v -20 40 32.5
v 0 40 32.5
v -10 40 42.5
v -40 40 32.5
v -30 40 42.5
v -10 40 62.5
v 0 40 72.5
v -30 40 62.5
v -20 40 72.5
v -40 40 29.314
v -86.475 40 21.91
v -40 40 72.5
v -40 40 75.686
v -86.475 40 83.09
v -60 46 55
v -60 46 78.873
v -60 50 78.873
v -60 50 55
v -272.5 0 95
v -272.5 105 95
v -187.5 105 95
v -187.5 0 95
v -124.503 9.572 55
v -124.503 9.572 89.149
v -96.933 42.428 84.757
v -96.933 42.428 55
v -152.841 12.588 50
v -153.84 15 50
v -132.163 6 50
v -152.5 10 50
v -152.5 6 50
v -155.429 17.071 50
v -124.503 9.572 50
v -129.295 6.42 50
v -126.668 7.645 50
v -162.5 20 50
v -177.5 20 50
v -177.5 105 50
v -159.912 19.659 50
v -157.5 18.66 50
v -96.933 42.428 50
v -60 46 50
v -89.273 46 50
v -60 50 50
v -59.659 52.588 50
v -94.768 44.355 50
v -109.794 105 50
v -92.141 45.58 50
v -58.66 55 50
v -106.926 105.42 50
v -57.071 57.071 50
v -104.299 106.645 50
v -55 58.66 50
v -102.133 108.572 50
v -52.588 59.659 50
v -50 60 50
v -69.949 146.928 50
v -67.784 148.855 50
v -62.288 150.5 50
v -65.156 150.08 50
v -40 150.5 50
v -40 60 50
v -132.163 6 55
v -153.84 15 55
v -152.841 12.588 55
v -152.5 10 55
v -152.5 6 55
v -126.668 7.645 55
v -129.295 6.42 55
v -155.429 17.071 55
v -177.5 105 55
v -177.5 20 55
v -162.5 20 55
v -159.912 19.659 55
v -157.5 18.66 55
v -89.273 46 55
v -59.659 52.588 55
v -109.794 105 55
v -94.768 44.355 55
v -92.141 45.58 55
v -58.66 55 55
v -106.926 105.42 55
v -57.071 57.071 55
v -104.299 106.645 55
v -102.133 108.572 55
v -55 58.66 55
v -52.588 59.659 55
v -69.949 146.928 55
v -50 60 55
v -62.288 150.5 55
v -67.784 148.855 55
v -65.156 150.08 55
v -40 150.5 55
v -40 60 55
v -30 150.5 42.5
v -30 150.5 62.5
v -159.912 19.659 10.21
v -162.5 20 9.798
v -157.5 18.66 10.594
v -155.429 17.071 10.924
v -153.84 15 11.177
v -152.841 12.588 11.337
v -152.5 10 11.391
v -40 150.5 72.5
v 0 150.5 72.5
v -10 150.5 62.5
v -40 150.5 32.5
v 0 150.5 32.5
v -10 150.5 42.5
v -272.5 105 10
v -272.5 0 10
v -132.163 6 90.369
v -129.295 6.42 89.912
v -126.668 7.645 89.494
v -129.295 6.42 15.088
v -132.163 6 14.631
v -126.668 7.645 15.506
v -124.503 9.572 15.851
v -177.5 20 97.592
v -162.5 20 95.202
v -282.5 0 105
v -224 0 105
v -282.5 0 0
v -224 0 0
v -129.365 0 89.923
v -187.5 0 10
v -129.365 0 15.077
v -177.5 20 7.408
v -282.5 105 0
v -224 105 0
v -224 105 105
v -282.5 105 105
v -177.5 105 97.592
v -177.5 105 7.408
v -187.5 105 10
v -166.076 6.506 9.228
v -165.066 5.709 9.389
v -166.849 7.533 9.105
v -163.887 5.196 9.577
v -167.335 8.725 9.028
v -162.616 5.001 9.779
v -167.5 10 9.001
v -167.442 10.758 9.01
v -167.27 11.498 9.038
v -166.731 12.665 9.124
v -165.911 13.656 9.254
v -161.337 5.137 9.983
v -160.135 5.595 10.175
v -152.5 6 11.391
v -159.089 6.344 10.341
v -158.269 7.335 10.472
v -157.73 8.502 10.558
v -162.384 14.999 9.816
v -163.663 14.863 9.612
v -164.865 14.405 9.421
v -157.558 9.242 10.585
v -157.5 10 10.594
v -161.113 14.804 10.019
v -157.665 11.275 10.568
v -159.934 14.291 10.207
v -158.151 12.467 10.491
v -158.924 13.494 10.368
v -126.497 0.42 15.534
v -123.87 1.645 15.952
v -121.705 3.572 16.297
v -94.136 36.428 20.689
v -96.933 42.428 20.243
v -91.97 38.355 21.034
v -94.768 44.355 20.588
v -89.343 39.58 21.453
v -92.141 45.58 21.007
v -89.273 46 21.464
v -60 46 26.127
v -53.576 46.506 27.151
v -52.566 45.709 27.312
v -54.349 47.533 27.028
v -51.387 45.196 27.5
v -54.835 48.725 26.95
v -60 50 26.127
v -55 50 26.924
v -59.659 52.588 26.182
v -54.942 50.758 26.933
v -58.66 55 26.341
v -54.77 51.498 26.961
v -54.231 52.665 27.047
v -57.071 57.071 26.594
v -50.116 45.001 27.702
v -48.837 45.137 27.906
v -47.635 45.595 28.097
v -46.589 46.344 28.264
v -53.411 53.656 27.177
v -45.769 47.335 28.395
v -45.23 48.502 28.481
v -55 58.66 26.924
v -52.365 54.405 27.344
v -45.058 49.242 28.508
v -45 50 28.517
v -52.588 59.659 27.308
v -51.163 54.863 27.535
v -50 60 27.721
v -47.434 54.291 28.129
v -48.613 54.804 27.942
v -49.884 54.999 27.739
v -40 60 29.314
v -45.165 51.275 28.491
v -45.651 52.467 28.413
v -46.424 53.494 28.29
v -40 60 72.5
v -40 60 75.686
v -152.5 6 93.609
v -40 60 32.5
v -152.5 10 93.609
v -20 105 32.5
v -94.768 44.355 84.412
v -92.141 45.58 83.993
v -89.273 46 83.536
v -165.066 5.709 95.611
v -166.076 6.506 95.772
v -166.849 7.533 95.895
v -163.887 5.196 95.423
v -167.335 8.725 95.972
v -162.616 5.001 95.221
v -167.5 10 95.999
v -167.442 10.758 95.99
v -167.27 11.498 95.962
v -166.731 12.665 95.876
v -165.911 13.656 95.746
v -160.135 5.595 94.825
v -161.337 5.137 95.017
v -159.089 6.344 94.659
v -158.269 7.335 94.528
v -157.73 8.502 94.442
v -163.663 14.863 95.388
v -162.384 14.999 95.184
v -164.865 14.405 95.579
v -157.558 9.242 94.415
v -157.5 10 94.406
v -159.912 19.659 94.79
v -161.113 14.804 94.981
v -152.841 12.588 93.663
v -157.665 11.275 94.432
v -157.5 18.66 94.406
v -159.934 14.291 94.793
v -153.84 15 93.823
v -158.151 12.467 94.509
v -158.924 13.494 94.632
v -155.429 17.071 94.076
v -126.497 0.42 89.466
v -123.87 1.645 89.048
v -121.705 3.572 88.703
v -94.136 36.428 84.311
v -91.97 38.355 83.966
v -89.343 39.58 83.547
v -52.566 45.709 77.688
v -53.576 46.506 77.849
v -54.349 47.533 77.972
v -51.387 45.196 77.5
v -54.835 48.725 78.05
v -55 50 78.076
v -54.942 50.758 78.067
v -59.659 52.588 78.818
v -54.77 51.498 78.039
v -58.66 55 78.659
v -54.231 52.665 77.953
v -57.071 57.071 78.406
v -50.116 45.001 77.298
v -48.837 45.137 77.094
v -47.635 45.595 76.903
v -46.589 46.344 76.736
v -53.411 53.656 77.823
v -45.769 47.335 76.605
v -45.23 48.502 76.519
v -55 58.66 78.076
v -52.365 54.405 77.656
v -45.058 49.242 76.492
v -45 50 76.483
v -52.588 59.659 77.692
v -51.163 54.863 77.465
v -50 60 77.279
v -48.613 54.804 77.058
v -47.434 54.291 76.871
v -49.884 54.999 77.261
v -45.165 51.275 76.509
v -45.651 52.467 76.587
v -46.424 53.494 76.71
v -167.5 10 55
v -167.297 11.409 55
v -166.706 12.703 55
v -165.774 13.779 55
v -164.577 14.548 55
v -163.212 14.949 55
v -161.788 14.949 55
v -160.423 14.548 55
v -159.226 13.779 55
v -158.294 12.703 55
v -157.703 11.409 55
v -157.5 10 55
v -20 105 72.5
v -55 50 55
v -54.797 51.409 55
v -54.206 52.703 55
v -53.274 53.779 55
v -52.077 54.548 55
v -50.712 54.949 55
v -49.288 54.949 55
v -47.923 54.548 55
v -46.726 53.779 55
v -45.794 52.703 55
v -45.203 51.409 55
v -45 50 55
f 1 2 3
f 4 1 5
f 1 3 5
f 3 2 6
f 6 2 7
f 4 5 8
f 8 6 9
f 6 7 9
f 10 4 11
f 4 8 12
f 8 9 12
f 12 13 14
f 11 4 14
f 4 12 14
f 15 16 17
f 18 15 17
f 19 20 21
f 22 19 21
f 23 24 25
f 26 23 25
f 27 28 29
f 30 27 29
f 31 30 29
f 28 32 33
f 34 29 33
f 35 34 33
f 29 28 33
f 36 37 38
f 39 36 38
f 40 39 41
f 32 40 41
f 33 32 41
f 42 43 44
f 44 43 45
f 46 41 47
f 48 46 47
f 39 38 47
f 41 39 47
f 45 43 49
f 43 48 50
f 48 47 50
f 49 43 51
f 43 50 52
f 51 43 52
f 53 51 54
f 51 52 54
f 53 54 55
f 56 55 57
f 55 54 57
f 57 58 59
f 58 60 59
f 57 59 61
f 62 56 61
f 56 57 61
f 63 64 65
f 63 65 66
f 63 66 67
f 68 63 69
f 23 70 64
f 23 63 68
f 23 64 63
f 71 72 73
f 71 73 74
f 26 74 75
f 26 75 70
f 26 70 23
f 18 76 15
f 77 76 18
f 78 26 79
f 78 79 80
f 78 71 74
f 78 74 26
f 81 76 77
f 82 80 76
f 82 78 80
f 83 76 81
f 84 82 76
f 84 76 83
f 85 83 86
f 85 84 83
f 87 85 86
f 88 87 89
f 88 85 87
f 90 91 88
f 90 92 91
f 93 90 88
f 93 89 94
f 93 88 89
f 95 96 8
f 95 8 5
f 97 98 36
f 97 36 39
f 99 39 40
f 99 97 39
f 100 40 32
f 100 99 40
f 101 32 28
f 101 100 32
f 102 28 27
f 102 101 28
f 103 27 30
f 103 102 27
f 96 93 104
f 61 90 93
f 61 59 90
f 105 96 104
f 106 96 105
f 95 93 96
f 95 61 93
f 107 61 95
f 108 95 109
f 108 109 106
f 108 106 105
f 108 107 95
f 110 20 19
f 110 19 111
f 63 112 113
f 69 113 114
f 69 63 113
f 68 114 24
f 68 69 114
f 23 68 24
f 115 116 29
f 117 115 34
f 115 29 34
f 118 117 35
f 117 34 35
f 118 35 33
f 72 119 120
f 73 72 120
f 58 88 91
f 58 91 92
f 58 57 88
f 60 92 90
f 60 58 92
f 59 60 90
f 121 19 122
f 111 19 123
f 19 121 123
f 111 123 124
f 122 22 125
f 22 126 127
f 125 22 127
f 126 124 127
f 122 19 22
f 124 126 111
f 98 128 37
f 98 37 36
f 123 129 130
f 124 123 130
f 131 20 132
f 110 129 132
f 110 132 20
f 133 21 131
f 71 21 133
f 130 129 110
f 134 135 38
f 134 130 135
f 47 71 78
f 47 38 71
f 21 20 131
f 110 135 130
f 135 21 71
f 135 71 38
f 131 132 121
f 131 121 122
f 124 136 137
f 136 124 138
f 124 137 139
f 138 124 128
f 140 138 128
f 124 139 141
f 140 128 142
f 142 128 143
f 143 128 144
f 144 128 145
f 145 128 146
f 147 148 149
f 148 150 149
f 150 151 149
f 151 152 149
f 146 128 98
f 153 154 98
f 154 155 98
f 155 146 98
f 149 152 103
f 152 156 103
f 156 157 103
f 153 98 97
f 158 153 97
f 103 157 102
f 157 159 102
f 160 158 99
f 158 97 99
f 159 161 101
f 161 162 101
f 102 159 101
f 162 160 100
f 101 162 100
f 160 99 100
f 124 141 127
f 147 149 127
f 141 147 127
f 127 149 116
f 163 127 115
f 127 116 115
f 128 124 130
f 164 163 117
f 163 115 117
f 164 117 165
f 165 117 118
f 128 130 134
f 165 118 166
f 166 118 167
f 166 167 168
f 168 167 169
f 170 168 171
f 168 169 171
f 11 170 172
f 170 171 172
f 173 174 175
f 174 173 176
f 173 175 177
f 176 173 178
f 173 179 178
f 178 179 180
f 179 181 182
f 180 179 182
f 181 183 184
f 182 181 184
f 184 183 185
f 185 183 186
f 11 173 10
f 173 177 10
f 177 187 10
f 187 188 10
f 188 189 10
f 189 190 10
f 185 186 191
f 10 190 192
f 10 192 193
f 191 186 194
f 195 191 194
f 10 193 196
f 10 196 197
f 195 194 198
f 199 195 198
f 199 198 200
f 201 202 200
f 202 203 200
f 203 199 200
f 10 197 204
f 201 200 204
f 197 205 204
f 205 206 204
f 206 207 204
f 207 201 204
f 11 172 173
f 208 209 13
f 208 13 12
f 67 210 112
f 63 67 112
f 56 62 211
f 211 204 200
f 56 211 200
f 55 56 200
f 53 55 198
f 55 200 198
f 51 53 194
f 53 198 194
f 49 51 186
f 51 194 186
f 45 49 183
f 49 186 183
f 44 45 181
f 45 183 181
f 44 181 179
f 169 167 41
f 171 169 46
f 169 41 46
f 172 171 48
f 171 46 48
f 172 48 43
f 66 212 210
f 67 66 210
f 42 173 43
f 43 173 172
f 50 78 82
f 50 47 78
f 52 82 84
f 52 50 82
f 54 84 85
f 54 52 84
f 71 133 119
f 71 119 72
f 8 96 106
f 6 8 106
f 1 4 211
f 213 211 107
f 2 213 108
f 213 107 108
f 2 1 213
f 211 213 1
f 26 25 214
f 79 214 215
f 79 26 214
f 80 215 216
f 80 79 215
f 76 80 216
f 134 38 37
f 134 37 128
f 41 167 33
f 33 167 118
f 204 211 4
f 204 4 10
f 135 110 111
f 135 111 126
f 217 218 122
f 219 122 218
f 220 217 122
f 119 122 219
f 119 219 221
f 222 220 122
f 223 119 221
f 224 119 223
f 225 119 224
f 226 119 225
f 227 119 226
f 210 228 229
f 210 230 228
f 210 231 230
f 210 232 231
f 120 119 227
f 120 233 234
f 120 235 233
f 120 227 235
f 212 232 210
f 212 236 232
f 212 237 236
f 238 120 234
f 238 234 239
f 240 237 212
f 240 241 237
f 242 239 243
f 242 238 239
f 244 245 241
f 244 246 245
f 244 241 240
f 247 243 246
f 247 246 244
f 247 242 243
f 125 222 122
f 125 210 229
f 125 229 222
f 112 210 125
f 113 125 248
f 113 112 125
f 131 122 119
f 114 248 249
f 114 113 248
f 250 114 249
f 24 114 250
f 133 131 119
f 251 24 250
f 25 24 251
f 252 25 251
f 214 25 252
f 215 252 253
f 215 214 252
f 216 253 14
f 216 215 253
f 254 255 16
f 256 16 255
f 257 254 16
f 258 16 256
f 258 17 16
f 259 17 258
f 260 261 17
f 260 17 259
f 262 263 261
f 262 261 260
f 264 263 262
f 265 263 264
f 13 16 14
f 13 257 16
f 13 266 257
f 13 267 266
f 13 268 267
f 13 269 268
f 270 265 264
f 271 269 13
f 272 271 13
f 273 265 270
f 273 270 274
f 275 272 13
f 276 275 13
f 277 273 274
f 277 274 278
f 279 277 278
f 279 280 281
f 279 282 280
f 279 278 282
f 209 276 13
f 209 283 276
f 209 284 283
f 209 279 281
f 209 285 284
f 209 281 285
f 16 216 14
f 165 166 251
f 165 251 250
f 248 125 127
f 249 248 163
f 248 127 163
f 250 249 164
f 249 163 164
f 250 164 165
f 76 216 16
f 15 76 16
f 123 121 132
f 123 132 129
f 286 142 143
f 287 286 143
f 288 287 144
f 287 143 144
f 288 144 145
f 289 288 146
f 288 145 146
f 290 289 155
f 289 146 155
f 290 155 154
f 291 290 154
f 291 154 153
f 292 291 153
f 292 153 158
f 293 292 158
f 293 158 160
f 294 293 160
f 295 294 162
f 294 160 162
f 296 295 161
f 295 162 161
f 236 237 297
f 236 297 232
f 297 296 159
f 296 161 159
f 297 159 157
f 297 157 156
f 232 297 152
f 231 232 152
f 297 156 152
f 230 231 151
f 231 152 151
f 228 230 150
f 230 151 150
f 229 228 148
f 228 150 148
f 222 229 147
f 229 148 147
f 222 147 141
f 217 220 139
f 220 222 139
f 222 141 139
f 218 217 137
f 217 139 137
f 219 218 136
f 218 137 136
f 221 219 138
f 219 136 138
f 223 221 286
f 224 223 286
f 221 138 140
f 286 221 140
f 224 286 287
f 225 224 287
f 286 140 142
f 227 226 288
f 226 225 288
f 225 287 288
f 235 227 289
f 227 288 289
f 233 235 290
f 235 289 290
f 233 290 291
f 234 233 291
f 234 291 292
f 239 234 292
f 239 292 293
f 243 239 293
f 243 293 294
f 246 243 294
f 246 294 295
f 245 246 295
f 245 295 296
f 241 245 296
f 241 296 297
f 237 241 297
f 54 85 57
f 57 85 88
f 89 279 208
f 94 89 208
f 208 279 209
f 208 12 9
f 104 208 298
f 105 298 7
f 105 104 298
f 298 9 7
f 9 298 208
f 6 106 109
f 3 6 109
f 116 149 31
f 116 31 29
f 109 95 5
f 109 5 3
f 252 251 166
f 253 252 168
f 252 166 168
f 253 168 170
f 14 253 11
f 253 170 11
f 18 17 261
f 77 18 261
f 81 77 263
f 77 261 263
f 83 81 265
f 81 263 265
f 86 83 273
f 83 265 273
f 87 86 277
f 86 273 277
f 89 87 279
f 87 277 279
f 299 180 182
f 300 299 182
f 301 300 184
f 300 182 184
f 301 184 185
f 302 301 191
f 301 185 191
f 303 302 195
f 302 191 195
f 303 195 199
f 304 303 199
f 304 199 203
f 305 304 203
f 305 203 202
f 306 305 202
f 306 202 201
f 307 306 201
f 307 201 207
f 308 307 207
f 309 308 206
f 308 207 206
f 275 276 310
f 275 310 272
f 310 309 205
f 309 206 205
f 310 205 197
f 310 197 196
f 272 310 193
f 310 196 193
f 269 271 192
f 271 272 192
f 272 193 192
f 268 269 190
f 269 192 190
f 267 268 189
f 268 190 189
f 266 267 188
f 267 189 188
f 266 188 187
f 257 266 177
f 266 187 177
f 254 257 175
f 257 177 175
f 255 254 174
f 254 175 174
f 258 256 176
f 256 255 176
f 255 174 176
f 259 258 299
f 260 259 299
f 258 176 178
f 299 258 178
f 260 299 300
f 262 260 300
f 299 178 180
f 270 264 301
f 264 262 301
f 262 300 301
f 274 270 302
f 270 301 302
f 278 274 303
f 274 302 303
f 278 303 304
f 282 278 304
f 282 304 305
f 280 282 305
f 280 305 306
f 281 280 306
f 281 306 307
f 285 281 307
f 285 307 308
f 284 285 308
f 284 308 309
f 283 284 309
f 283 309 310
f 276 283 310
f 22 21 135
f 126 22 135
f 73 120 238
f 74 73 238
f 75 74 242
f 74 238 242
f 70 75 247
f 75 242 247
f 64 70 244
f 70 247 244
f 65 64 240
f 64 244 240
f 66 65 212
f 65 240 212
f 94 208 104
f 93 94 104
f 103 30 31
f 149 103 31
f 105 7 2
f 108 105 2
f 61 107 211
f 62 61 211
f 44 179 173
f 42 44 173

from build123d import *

# Parameters (mm, degrees)
SKETCH1_W           = 282.5
SKETCH1_H           = 105
BOSS_EXTRUDE1_DEPTH = 150.5
SKETCH2_W           = 155
SKETCH2_H           = 105
CUT_EXTRUDE1_DEPTH  = 45.5
SKETCH3_W           = 50
SKETCH3_H           = 50
CUT_EXTRUDE2_DEPTH  = 85
SKETCH4_R           = 5
CUT_EXTRUDE3_DEPTH  = 50
SKETCH5_R           = 5
CUT_EXTRUDE4_DEPTH  = 50
CUT_EXTRUDE5_DEPTH  = 106
CUT_EXTRUDE6_DEPTH  = 106
SKETCH8_R           = 5
CUT_EXTRUDE7_DEPTH  = 50
CUT_EXTRUDE8_DEPTH  = 50
SKETCH10_R          = 5
CUT_EXTRUDE9_DEPTH  = 106
SKETCH11_R          = 5
CUT_EXTRUDE10_DEPTH = 106
SKETCH12_W          = 85
SKETCH12_H          = 85
CUT_EXTRUDE11_DEPTH = 106
SKETCH13_W          = 40
SKETCH13_H          = 32.5
CUT_EXTRUDE12_DEPTH = 151.5
SKETCH14_W          = 20
SKETCH14_H          = 20
CUT_EXTRUDE13_DEPTH = 151.5
CUT_EXTRUDE14_DEPTH = 106
FILLET1_R           = 10
FILLET2_R           = 10
FILLET3_R           = 10


with BuildPart() as part:
    # Sketch1 → Boss-Extrude1 (new body)
    with BuildSketch(Plane(origin=(0, 0, 0), x_dir=(1, 0, 0), z_dir=(0, 1, 0))):
        with Locations((-141.25, -52.5)):
            Rectangle(SKETCH1_W, SKETCH1_H)
    extrude(amount=BOSS_EXTRUDE1_DEPTH)

    # Sketch2 → Cut-Extrude1 (cut)
    with BuildSketch(Plane(origin=(0, 150.5, 0), x_dir=(1, 0, 0), z_dir=(0, 1, 0))):
        with Locations((-205, -52.5)):
            Rectangle(SKETCH2_W, SKETCH2_H)
    extrude(amount=-CUT_EXTRUDE1_DEPTH, mode=Mode.SUBTRACT)

    # Sketch3 → Cut-Extrude2 (cut)
    with BuildSketch(Plane(origin=(0, 105, 0), x_dir=(1, 0, 0), z_dir=(0, 1, 0))):
        with Locations((-152.5, -80)):
            Rectangle(SKETCH3_W, SKETCH3_H)
        with Locations((-152.5, -25)):
            Rectangle(SKETCH3_W, SKETCH3_H)
    extrude(amount=-CUT_EXTRUDE2_DEPTH, mode=Mode.SUBTRACT)

    # Sketch4 → Cut-Extrude3 (cut)
    with BuildSketch(Plane.XY.offset(105)):
        with Locations((-162.5, 10)):
            Circle(SKETCH4_R)
        with BuildLine():
            Line((-152.5, 6), (-127.5, 6))
            Line((-127.5, 6), (-127.5, 105))
            Line((-127.5, 105), (-177.5, 105))
            Line((-177.5, 105), (-177.5, 20))
            Line((-177.5, 20), (-162.5, 20))
            ThreePointArc((-162.5, 20), (-155.428932188, 17.071067812), (-152.5, 10))
            Line((-152.5, 10), (-152.5, 6))
        make_face()
    extrude(amount=-CUT_EXTRUDE3_DEPTH, mode=Mode.SUBTRACT)

    # Sketch5 → Cut-Extrude4 (cut)
    with BuildSketch(Plane(origin=(0, 0, 0), x_dir=(-1, 0, 0), z_dir=(0, 0, -1))):
        with Locations((162.5, 10)):
            Circle(SKETCH5_R)
        with BuildLine():
            Line((127.5, 105), (177.5, 105))
            Line((177.5, 105), (177.5, 20))
            Line((177.5, 20), (162.5, 20))
            ThreePointArc((162.5, 20), (155.428932188, 17.071067812), (152.5, 10))
            Line((152.5, 10), (152.5, 6))
            Line((152.5, 6), (127.5, 6))
            Line((127.5, 6), (127.5, 105))
        make_face()
    extrude(amount=-CUT_EXTRUDE4_DEPTH, mode=Mode.SUBTRACT)

    # Sketch6 → Cut-Extrude5 (cut, through all)
    with BuildSketch(Plane.XY.offset(105)):
        Polygon((0, 40), (-91.138168804, 40), (-124.702154051, 0), (0, 0), align=None)
    extrude(amount=-CUT_EXTRUDE5_DEPTH, mode=Mode.SUBTRACT)

    # Sketch7 → Cut-Extrude6 (cut, through all)
    with BuildSketch(Plane.XY.offset(105)):
        Polygon((-127.5, 105), (-105.130575467, 105), (-66.951542249, 150.5), (-127.5, 150.5), align=None)
    extrude(amount=-CUT_EXTRUDE6_DEPTH, mode=Mode.SUBTRACT)

    # Sketch8 → Cut-Extrude7 (cut)
    with BuildSketch(Plane.XY.offset(105)):
        with Locations((-50, 50)):
            Circle(SKETCH8_R)
        with BuildLine():
            Line((-40, 150.5), (-66.951542249, 150.5))
            Line((-66.951542249, 150.5), (-105.130575467, 105))
            Line((-105.130575467, 105), (-127.5, 105))
            Line((-127.5, 105), (-127.5, 6))
            Line((-127.5, 6), (-93.936014753, 46))
            Line((-93.936014753, 46), (-60, 46))
            Line((-60, 46), (-60, 50))
            ThreePointArc((-60, 50), (-57.071067812, 57.071067812), (-50, 60))
            Line((-50, 60), (-40, 60))
            Line((-40, 60), (-40, 150.5))
        make_face()
    extrude(amount=-CUT_EXTRUDE7_DEPTH, mode=Mode.SUBTRACT)

    # Sketch9 → Cut-Extrude8 (cut)
    with BuildSketch(Plane(origin=(0, 0, 0), x_dir=(-1, 0, 0), z_dir=(0, 0, -1))):
        with BuildLine():
            Line((66.951542249, 150.5), (40, 150.5))
            Line((40, 150.5), (40, 60))
            Line((40, 60), (50, 60))
            ThreePointArc((50, 60), (57.071067812, 57.071067812), (60, 50))
            Line((60, 50), (60, 46))
            Line((60, 46), (93.936014753, 46))
            Line((93.936014753, 46), (127.5, 6))
            Line((127.5, 6), (127.5, 105))
            Line((127.5, 105), (105.130575467, 105))
            Line((105.130575467, 105), (66.951542249, 150.5))
        make_face()
    extrude(amount=-CUT_EXTRUDE8_DEPTH, mode=Mode.SUBTRACT)

    # Sketch10 → Cut-Extrude9 (cut, through all)
    with BuildSketch(Plane(origin=(0, 0, 0), x_dir=(-1, 0, 0), z_dir=(0, 0, -1))):
        with Locations((50, 50)):
            Circle(SKETCH10_R)
    extrude(amount=-CUT_EXTRUDE9_DEPTH, mode=Mode.SUBTRACT)

    # Sketch11 → Cut-Extrude10 (cut, through all)
    with BuildSketch(Plane(origin=(0, 0, 0), x_dir=(-1, 0, 0), z_dir=(0, 0, -1))):
        with Locations((162.5, 10)):
            Circle(SKETCH11_R)
    extrude(amount=-CUT_EXTRUDE10_DEPTH, mode=Mode.SUBTRACT)

    # Sketch12 → Cut-Extrude11 (cut, through all)
    with BuildSketch(Plane(origin=(0, 105, 0), x_dir=(1, 0, 0), z_dir=(0, 1, 0))):
        with Locations((-230, -52.5)):
            Rectangle(SKETCH12_W, SKETCH12_H)
    extrude(amount=-CUT_EXTRUDE11_DEPTH, mode=Mode.SUBTRACT)

    # Sketch13 → Cut-Extrude12 (cut, through all)
    with BuildSketch(Plane(origin=(0, 150.5, 0), x_dir=(1, 0, 0), z_dir=(0, 1, 0))):
        with Locations((-20, -88.75)):
            Rectangle(SKETCH13_W, SKETCH13_H)
        with Locations((-20, -16.25)):
            Rectangle(SKETCH13_W, SKETCH13_H)
    extrude(amount=-CUT_EXTRUDE12_DEPTH, mode=Mode.SUBTRACT)

    # Sketch14 → Cut-Extrude13 (cut, through all)
    with BuildSketch(Plane(origin=(0, 150.5, 0), x_dir=(1, 0, 0), z_dir=(0, 1, 0))):
        with Locations((-20, -52.5)):
            Rectangle(SKETCH14_W, SKETCH14_H)
    extrude(amount=-CUT_EXTRUDE13_DEPTH, mode=Mode.SUBTRACT)

    # Sketch15 → Cut-Extrude14 (cut, through all)
    with BuildSketch(Plane(origin=(0, 105, 0), x_dir=(1, 0, 0), z_dir=(0, 1, 0))):
        Polygon((-224, 0), (-20, -32.5), (-20, 0), align=None)
        Polygon((-224, -105), (-20, -72.5), (-20, -105), align=None)
    extrude(amount=-CUT_EXTRUDE14_DEPTH, mode=Mode.SUBTRACT)

    # Fillet1
    fillet1_edges = [part.edges().sort_by_distance(p)[0] for p in [
        (-93.936014753, 46, 69.639510979),
        (-93.936014753, 46, 35.360489021),
        (-127.5, 6, 72.313112745),
        (-127.5, 6, 32.686887255),
    ]]
    fillet(fillet1_edges, radius=FILLET1_R)

    # Fillet2
    fillet2_edges = [part.edges().sort_by_distance(p)[0] for p in [
        (-124.702154051, 0, 52.5),
        (-91.138168804, 40, 52.5),
    ]]
    fillet(fillet2_edges, radius=FILLET2_R)

    # Fillet3
    fillet3_edges = [part.edges().sort_by_distance(p)[0] for p in [
        (-105.130575467, 105, 52.5),
        (-66.951542249, 150.5, 52.5),
    ]]
    fillet(fillet3_edges, radius=FILLET3_R)


solid = part.part
